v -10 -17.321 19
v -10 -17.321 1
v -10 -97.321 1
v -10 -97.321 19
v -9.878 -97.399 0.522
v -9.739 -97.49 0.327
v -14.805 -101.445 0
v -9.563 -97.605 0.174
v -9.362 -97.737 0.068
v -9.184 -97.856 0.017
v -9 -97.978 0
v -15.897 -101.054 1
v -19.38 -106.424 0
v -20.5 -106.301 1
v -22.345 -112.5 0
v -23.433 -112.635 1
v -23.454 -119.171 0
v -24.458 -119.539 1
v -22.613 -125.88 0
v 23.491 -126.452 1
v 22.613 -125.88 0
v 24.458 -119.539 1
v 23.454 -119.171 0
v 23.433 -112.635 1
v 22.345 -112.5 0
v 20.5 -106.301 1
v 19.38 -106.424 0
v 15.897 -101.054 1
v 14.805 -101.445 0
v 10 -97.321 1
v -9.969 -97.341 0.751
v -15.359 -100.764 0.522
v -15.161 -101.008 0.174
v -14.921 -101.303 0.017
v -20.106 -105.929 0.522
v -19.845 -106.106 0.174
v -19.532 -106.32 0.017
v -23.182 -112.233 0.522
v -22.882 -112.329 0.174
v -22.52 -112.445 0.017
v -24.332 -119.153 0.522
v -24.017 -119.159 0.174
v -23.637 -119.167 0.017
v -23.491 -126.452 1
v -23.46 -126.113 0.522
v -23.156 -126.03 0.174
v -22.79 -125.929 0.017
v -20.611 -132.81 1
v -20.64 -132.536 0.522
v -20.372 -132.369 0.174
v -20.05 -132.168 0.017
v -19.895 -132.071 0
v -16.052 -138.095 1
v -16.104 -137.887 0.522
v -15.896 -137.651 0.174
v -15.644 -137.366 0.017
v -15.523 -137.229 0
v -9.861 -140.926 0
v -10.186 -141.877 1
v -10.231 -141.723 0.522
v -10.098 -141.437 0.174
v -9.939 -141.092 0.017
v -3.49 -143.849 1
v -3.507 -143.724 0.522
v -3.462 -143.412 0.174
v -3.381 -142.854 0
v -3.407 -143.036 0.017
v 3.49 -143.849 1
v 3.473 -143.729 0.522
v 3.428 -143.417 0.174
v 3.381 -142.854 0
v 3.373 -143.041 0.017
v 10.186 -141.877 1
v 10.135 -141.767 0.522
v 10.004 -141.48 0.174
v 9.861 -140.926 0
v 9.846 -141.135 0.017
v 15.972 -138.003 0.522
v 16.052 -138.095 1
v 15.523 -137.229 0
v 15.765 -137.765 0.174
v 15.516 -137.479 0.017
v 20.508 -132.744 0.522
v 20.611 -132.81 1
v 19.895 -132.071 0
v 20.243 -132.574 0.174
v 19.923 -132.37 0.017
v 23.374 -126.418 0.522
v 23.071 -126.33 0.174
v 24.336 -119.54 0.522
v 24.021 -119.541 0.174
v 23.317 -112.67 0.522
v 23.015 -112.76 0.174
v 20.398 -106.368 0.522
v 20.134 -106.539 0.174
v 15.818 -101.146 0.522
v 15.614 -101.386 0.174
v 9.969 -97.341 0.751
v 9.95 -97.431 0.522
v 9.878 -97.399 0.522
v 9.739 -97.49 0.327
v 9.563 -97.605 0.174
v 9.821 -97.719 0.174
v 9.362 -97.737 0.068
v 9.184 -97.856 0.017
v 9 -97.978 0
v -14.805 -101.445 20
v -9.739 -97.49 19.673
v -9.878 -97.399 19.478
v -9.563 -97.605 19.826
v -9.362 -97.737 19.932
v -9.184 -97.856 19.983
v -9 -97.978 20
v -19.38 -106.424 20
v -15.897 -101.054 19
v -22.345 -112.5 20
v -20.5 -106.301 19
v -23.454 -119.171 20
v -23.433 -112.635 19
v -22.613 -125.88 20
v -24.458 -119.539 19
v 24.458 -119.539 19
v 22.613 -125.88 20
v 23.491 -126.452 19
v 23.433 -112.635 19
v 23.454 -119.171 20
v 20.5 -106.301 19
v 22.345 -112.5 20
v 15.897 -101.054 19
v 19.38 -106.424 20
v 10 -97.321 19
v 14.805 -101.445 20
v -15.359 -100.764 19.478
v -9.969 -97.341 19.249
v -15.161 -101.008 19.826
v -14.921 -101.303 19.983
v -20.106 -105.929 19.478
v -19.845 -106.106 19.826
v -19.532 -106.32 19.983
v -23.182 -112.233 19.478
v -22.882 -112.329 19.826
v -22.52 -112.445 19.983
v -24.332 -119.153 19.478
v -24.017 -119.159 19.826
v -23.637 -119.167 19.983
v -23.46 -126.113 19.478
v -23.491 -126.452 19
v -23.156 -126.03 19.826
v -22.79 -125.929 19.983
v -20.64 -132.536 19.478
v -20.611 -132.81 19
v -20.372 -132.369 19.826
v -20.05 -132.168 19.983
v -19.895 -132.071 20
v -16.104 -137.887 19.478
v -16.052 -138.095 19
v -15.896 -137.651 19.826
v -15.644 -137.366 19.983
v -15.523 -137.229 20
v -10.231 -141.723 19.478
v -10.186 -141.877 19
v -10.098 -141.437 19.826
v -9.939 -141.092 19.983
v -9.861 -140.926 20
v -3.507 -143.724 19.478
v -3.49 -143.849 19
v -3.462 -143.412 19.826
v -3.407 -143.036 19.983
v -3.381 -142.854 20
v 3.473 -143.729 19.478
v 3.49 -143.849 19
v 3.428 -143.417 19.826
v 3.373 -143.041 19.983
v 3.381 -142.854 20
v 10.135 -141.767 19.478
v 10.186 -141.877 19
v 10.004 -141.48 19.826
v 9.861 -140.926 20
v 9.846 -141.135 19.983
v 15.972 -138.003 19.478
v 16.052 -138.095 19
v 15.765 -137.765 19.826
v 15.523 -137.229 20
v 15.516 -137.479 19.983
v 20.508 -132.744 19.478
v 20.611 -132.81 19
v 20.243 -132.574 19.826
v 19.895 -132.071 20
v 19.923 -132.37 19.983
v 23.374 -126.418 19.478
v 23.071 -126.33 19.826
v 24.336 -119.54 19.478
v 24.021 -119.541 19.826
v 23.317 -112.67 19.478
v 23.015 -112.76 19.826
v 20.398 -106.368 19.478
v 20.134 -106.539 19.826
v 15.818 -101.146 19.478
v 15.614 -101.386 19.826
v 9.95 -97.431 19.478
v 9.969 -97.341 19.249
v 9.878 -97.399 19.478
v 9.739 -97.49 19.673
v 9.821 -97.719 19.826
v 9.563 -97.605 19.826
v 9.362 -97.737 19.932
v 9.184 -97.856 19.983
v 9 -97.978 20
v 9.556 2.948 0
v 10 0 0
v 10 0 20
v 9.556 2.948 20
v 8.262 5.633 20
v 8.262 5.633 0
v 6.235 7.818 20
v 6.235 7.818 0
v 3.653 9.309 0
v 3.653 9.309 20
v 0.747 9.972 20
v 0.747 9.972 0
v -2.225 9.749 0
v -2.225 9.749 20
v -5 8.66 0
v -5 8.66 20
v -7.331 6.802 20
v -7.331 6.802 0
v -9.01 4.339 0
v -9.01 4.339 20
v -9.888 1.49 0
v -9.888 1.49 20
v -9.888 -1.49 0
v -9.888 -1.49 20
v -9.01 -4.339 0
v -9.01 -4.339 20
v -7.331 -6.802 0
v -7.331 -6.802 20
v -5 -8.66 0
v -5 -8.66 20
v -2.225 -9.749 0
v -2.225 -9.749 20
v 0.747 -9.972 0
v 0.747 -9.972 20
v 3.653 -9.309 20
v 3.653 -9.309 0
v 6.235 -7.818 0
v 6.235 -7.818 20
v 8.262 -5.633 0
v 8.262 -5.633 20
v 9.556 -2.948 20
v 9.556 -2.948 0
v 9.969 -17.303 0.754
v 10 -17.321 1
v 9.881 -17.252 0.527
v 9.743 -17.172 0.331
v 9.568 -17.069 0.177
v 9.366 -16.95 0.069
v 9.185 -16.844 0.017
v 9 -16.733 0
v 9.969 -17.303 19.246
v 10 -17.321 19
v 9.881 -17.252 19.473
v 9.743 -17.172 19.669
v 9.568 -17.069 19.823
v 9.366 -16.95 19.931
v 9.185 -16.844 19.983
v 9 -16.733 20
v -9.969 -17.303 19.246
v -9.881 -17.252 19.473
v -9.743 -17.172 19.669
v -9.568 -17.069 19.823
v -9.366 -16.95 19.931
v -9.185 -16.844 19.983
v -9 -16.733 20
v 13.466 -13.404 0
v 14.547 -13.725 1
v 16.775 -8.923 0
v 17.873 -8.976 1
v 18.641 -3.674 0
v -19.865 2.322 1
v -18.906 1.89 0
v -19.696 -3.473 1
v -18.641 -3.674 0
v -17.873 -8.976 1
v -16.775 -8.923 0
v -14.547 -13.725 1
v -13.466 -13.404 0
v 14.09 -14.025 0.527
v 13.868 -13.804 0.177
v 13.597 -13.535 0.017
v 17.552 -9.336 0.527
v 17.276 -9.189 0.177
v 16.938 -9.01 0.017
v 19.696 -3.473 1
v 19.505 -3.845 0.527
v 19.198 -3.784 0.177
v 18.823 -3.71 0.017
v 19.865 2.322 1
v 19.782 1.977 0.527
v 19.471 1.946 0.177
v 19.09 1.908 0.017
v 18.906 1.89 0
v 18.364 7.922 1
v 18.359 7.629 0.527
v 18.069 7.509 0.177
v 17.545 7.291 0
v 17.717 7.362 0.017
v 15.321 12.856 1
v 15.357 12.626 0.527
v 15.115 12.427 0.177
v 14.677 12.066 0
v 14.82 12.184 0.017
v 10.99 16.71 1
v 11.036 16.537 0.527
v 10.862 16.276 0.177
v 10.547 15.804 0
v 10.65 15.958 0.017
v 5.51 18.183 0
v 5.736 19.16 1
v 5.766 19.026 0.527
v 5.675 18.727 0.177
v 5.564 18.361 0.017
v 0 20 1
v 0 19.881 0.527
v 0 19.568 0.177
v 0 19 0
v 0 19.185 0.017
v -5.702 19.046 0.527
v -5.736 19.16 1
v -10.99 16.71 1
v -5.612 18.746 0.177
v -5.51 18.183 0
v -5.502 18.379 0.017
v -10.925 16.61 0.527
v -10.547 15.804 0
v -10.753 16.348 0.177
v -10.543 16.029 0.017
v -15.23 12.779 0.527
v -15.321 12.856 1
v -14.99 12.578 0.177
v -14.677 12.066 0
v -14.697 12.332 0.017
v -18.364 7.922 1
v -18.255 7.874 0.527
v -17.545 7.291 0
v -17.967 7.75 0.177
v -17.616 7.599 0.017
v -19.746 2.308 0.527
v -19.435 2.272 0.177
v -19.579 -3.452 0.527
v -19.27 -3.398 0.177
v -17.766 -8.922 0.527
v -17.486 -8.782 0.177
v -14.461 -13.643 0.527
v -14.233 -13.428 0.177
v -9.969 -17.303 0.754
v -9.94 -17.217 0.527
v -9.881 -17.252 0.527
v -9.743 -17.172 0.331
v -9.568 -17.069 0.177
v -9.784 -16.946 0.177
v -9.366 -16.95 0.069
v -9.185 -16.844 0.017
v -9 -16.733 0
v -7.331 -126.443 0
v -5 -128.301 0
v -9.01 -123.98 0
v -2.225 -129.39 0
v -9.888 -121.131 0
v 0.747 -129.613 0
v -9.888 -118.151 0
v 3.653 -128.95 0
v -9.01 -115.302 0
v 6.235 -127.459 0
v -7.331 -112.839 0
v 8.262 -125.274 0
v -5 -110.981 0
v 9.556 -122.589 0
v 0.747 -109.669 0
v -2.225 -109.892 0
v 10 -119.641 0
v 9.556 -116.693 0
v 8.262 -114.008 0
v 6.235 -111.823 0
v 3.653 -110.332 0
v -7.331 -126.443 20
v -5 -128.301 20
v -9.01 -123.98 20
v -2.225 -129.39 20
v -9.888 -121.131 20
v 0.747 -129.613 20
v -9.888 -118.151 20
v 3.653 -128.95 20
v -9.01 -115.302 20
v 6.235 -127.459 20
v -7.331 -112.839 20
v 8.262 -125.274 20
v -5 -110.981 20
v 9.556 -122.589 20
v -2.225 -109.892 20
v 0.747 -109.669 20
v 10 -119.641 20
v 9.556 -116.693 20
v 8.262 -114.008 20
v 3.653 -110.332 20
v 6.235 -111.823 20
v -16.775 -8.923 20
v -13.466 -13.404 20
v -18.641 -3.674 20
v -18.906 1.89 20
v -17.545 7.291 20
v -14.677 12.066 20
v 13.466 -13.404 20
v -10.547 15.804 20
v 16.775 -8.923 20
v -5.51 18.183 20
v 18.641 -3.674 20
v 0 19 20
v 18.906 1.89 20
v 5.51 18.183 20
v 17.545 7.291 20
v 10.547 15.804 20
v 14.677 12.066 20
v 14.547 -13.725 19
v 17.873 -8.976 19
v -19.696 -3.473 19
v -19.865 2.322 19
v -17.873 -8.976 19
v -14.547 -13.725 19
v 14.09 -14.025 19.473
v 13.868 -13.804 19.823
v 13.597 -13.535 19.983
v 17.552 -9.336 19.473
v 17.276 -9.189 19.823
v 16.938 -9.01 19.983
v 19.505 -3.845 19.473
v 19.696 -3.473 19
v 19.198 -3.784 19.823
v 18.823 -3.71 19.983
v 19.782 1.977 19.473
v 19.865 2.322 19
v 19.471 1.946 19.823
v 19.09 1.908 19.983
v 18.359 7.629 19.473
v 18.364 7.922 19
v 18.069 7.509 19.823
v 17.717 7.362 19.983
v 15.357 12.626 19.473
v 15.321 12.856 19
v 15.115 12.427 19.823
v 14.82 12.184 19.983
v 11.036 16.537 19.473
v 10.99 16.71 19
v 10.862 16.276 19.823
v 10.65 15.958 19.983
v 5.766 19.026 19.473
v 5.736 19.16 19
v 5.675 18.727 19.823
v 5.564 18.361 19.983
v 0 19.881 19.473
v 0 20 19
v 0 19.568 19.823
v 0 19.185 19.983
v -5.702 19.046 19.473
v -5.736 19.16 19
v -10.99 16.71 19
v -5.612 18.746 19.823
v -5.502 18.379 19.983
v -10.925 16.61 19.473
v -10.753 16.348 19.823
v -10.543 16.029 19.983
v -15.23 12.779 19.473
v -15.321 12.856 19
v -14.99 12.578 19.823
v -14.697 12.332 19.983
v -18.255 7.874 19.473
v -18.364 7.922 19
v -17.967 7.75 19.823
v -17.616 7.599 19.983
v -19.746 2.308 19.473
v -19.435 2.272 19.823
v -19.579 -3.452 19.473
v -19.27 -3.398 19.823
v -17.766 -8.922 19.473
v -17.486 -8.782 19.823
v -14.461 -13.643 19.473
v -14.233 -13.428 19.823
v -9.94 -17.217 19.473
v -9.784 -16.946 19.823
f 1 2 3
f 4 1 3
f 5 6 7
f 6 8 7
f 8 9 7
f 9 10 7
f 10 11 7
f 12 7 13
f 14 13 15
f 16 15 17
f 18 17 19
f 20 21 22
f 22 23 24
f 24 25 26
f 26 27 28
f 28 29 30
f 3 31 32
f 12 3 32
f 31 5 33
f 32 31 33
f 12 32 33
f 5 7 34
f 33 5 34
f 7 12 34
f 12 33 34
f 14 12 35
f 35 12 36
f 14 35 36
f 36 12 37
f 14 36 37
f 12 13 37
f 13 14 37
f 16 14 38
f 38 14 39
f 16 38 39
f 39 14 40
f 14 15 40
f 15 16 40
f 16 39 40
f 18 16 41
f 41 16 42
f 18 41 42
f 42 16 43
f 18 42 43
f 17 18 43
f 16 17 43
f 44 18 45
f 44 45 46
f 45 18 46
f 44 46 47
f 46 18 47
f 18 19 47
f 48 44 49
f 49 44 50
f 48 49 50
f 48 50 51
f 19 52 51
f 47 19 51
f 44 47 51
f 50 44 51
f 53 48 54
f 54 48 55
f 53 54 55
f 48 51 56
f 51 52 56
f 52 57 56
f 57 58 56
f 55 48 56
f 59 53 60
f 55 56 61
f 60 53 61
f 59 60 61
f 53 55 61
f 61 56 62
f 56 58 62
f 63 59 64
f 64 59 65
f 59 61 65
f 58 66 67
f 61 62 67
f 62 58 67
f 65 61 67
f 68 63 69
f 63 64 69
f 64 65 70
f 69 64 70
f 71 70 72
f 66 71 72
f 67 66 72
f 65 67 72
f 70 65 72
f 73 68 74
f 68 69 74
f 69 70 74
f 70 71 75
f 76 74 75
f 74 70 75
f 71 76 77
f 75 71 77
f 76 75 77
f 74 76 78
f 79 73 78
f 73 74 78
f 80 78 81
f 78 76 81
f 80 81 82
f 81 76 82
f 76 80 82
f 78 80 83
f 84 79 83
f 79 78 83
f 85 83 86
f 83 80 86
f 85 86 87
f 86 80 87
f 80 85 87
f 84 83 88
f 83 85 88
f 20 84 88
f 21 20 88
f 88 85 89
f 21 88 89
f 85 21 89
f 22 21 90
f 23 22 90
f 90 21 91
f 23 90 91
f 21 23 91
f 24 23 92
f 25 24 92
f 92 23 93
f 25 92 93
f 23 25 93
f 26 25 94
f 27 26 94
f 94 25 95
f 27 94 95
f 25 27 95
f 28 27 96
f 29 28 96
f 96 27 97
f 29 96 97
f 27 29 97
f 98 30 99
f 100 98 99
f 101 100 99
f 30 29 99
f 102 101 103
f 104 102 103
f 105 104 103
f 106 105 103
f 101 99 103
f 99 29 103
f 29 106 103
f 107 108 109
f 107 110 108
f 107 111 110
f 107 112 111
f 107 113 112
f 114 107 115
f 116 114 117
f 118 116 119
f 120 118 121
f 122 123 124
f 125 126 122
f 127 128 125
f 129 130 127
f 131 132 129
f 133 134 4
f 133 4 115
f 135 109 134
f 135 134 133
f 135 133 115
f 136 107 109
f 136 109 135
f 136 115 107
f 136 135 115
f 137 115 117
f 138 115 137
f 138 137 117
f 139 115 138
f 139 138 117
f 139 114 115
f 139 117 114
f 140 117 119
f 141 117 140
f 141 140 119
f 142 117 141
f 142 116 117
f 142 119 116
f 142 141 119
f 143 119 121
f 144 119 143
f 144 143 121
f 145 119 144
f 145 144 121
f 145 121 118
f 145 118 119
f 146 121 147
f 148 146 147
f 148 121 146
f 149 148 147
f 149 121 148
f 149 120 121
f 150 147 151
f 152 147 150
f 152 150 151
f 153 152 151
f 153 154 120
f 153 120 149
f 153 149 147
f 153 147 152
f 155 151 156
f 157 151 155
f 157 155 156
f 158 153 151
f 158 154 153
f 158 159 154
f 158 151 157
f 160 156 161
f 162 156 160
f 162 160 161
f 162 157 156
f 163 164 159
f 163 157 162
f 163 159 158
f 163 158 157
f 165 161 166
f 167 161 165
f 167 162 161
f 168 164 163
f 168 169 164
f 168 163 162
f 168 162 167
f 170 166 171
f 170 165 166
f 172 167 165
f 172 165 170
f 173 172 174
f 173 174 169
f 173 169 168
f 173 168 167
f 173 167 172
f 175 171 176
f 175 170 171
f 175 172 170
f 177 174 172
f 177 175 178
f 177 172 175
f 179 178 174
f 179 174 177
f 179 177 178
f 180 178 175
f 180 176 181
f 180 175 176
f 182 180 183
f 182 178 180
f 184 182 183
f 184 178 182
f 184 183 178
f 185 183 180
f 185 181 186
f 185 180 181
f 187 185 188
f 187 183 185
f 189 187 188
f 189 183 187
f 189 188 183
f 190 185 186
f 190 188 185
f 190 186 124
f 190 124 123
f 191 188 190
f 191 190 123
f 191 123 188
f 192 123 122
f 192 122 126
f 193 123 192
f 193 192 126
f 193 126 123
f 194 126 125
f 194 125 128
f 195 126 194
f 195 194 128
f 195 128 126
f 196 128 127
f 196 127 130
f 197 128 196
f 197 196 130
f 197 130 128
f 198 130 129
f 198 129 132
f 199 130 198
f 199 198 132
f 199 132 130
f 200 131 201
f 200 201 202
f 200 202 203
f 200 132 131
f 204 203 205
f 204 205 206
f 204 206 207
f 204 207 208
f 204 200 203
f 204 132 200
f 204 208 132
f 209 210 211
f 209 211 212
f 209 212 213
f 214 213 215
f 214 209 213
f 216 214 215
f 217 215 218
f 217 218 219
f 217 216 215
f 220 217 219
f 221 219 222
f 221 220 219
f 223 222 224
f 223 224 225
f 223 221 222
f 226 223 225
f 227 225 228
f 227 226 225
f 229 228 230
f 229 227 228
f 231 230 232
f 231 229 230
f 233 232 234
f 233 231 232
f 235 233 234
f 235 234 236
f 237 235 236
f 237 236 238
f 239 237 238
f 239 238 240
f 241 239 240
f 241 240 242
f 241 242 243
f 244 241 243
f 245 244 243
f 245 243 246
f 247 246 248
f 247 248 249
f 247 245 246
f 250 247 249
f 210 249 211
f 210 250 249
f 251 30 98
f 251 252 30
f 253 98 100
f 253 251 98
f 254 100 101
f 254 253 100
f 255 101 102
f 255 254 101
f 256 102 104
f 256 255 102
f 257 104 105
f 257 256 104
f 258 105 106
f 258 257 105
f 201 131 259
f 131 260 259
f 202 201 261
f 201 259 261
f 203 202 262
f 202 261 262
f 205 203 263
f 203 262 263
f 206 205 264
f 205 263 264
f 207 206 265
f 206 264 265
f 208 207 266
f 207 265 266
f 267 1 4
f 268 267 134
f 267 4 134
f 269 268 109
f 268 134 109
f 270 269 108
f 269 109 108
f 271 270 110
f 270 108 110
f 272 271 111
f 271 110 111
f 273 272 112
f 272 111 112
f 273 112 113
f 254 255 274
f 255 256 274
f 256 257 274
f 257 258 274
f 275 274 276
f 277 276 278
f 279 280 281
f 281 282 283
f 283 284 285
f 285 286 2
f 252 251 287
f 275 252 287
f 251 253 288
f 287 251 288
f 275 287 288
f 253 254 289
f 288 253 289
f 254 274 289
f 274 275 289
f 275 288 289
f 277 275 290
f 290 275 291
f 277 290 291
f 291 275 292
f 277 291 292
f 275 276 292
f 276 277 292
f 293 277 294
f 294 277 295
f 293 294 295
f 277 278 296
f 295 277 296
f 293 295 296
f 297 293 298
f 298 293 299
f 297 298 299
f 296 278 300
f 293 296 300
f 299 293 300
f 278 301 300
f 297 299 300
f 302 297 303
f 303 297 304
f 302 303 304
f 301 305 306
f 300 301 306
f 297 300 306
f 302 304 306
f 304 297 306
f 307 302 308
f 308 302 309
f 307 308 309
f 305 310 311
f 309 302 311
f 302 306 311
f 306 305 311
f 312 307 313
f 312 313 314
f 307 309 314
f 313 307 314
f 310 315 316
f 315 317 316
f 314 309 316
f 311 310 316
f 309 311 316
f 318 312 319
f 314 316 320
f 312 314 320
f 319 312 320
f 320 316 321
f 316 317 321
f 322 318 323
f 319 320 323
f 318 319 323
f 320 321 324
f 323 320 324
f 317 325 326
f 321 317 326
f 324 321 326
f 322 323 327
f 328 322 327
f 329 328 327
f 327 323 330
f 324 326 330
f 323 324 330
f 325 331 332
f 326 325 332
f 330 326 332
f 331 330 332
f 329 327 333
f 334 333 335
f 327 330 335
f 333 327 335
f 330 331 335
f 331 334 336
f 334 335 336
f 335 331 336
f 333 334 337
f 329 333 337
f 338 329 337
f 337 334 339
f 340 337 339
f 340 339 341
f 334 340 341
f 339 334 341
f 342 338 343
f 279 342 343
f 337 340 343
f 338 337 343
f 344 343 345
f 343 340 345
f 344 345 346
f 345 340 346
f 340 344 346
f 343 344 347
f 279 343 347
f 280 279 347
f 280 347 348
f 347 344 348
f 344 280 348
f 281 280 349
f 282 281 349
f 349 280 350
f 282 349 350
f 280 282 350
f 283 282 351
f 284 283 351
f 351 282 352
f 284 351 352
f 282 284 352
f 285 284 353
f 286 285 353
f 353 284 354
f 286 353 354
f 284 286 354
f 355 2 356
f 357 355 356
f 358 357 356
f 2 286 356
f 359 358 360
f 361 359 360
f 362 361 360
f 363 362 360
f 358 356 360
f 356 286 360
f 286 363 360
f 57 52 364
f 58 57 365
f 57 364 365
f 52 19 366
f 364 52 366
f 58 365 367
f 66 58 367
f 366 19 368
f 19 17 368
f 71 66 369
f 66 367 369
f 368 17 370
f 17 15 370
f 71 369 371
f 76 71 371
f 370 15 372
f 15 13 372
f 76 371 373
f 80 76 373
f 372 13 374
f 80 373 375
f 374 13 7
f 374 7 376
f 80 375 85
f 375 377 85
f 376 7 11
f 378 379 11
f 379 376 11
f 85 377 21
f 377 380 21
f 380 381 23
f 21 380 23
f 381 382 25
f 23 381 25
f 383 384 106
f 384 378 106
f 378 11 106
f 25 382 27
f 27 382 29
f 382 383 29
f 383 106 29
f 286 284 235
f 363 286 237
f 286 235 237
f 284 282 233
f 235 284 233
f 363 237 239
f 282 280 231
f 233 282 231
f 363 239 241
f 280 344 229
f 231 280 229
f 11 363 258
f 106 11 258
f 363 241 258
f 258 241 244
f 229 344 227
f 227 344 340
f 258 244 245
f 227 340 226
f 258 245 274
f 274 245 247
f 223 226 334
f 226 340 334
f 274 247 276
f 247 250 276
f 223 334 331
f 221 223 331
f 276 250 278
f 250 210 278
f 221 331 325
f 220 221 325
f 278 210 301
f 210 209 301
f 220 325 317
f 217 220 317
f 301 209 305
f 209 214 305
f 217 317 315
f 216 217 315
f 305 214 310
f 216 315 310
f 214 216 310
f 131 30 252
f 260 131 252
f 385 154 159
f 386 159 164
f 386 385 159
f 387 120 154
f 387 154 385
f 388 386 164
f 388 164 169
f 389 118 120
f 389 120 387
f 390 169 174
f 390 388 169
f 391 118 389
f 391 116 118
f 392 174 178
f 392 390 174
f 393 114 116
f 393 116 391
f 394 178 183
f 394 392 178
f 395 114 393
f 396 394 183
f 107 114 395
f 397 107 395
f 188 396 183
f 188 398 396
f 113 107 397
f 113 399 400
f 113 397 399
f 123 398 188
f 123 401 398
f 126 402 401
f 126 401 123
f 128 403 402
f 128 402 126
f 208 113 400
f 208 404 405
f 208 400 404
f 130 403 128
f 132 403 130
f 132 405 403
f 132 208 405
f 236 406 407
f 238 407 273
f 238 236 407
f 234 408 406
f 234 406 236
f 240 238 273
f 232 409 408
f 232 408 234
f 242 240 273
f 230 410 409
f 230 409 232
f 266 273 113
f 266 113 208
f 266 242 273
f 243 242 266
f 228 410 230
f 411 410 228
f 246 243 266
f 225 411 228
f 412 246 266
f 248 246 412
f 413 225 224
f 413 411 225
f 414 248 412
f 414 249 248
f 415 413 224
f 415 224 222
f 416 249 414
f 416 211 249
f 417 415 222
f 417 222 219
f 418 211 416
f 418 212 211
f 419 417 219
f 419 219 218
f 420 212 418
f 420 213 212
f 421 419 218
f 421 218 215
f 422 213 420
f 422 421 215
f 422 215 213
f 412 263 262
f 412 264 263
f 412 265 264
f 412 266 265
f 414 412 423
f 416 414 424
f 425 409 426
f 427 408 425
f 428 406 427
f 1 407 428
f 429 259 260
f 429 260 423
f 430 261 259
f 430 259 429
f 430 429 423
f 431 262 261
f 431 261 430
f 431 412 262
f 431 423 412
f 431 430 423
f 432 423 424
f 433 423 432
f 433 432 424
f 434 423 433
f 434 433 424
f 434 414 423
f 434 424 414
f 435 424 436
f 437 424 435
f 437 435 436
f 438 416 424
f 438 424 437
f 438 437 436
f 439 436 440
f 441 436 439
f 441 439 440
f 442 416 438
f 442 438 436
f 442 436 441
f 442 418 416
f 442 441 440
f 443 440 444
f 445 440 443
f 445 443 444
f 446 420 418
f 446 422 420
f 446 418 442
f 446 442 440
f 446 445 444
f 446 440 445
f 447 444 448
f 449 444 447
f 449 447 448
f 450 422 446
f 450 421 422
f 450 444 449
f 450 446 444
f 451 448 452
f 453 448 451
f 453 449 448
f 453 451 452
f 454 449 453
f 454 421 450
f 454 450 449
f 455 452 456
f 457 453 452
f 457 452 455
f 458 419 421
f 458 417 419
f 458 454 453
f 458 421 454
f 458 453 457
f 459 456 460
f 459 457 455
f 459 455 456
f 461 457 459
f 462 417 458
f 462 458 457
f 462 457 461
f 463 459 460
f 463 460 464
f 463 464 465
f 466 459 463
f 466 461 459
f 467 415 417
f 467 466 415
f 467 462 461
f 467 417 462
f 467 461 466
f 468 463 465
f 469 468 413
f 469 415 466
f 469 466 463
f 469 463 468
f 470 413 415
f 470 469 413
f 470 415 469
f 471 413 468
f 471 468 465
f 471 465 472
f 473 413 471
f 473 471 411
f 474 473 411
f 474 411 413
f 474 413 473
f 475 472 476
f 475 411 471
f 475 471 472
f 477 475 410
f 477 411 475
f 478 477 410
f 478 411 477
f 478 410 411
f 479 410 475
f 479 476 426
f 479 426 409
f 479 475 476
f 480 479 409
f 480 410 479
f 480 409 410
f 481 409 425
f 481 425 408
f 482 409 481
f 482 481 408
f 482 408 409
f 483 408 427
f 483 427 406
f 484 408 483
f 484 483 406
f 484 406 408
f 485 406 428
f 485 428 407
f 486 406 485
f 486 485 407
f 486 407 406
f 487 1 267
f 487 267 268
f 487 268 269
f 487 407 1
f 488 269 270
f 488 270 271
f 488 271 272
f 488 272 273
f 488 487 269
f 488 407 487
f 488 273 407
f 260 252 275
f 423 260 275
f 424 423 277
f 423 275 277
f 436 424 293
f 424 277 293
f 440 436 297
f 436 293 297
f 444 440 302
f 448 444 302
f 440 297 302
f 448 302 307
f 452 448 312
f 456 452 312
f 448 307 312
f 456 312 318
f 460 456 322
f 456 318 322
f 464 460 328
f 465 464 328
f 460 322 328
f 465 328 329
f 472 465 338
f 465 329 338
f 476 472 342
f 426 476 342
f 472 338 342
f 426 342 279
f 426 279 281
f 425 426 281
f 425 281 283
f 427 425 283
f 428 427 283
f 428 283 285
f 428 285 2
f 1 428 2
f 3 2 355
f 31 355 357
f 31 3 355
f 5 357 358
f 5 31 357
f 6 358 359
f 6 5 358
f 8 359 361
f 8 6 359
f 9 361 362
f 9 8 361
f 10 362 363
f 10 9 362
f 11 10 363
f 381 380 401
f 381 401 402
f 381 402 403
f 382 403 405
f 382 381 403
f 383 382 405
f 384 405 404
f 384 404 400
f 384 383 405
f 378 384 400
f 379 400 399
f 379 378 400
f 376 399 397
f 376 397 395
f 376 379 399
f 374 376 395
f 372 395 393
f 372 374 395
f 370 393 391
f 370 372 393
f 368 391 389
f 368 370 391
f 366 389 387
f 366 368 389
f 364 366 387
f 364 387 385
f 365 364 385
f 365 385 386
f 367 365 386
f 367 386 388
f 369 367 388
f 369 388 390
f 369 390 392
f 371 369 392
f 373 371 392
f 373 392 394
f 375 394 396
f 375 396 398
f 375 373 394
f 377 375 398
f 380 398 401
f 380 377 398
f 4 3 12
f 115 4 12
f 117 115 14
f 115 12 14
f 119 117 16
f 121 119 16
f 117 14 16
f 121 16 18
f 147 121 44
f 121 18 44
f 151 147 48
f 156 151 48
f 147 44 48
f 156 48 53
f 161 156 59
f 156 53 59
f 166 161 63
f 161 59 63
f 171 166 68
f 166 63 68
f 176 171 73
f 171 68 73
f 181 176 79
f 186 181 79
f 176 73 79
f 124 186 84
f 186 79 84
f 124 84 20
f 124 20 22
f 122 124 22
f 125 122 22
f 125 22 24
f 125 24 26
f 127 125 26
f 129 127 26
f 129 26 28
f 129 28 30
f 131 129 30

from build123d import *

# Parameters (mm, degrees)
ESQUISSE1_R        = 10
BOSS_EXTRU_1_DEPTH = 20
CONG_2_R           = 1


with BuildPart() as part:
    # Esquisse1 → Boss.-Extru.1 (new body)
    with BuildSketch(Plane.XY):
        with BuildLine():
            Line((-10, -17.320508076), (-10, -97.320508076))
            ThreePointArc((-10, -97.320508076), (0, -144.099247501), (10, -97.320508076))
            Line((10, -97.320508076), (10, -17.320508076))
            ThreePointArc((10, -17.320508076), (0, 20), (-10, -17.320508076))
        make_face()
        Circle(ESQUISSE1_R, mode=Mode.SUBTRACT)
        with Locations((0, -119.641016151)):
            Circle(ESQUISSE1_R, mode=Mode.SUBTRACT)
    extrude(amount=BOSS_EXTRU_1_DEPTH)

    # Congé2
    cong_2_edges = [part.edges().sort_by_distance(p)[0] for p in [
        (0, -144.099247501, 20),
        (10, -57.320508076, 20),
        (0, 20, 20),
        (10, -57.320508076, 0),
        (0, -144.099247501, 0),
        (-10, -57.320508076, 0),
        (0, 20, 0),
        (-10, -57.320508076, 20),
    ]]
    fillet(cong_2_edges, radius=CONG_2_R)


solid = part.part
